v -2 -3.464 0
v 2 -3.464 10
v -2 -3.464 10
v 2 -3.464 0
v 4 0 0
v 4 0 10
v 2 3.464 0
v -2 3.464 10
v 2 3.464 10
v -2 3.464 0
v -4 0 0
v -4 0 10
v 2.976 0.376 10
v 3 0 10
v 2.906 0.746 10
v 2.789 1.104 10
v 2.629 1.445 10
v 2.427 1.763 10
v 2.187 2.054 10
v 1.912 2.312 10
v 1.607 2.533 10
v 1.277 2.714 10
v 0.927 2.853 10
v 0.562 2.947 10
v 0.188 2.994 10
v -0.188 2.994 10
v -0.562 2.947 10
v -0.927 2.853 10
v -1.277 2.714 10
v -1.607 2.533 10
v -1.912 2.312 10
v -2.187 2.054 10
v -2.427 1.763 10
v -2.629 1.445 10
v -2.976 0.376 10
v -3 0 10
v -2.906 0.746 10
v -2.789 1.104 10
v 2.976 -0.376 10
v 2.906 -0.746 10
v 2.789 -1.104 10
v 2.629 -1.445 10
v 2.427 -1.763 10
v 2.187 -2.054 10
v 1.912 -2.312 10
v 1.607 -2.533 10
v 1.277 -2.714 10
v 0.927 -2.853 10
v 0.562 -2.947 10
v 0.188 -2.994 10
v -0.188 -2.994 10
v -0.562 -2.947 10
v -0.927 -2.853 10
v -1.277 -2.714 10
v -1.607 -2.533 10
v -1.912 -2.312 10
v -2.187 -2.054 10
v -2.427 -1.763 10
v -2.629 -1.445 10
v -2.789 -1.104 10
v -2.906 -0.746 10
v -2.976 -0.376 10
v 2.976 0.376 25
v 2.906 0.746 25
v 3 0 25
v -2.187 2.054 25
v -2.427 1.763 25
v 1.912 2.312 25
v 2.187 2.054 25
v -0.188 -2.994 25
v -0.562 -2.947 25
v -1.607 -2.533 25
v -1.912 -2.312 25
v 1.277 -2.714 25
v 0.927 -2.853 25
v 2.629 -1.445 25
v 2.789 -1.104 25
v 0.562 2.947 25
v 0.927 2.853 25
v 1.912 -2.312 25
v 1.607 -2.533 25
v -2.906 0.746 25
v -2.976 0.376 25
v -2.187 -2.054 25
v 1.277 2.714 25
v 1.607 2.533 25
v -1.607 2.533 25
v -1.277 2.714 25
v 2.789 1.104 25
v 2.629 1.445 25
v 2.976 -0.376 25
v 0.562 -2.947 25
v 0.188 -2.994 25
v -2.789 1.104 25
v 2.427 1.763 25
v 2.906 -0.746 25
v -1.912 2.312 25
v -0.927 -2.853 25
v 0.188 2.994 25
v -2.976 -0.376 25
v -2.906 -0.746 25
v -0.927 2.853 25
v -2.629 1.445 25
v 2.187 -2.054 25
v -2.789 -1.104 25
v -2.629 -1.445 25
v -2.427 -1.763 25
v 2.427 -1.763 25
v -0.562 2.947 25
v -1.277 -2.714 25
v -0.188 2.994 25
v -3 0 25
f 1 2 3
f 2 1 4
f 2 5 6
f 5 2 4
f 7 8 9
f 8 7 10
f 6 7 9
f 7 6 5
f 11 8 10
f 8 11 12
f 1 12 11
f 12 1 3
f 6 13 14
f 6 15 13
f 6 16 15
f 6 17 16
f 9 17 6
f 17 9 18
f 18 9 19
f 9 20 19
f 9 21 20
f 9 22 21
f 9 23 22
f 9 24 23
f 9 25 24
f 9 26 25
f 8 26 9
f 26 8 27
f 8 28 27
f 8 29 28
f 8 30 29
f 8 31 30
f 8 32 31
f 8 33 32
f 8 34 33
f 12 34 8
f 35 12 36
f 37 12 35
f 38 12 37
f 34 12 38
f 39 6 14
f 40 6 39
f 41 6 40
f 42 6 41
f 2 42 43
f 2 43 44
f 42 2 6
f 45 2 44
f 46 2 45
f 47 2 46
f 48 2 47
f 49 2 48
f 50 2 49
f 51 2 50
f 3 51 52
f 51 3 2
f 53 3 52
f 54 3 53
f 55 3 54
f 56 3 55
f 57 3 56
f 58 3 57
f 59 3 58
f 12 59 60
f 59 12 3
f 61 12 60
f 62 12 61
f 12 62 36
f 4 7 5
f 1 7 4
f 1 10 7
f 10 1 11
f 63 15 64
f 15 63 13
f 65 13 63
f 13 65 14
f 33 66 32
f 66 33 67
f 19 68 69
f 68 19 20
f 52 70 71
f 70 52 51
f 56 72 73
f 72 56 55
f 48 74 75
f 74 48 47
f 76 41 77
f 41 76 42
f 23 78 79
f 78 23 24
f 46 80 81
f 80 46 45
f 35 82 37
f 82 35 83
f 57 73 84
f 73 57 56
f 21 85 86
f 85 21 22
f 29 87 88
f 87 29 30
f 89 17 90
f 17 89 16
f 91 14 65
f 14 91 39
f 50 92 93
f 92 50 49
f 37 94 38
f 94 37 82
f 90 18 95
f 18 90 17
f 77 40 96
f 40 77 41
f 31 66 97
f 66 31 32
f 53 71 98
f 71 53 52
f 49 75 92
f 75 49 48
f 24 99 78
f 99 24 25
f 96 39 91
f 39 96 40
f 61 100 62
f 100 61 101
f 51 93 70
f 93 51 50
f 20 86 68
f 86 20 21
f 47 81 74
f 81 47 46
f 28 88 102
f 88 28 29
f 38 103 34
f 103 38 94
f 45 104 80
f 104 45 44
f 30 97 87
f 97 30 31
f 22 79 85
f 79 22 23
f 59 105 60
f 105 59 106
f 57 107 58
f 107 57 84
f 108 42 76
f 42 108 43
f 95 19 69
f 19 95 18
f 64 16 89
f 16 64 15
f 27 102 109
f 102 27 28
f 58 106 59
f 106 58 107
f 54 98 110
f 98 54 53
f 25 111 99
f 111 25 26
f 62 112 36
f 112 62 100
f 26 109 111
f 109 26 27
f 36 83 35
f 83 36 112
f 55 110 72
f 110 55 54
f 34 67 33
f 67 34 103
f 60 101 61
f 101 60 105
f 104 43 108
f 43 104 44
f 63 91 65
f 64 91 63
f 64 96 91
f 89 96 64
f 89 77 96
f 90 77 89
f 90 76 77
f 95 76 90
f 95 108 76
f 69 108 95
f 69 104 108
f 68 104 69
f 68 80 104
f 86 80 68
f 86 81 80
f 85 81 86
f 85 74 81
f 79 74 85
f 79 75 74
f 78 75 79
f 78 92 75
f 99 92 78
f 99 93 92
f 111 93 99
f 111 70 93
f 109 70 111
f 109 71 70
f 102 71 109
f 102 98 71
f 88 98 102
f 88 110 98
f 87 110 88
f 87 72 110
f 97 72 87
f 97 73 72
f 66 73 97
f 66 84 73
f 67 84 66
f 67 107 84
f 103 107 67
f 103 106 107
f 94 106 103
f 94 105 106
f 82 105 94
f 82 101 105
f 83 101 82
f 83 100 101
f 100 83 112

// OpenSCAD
d0 = 6;
d1 = 8;
l0 = 15;
l1 = 10;

union() {
  cylinder(r=d1 / 2, h=l1, $fn=6);
  
  translate([0, 0, l1])
    cylinder(r=d0 / 2, h=l0, $fn=50);
}
